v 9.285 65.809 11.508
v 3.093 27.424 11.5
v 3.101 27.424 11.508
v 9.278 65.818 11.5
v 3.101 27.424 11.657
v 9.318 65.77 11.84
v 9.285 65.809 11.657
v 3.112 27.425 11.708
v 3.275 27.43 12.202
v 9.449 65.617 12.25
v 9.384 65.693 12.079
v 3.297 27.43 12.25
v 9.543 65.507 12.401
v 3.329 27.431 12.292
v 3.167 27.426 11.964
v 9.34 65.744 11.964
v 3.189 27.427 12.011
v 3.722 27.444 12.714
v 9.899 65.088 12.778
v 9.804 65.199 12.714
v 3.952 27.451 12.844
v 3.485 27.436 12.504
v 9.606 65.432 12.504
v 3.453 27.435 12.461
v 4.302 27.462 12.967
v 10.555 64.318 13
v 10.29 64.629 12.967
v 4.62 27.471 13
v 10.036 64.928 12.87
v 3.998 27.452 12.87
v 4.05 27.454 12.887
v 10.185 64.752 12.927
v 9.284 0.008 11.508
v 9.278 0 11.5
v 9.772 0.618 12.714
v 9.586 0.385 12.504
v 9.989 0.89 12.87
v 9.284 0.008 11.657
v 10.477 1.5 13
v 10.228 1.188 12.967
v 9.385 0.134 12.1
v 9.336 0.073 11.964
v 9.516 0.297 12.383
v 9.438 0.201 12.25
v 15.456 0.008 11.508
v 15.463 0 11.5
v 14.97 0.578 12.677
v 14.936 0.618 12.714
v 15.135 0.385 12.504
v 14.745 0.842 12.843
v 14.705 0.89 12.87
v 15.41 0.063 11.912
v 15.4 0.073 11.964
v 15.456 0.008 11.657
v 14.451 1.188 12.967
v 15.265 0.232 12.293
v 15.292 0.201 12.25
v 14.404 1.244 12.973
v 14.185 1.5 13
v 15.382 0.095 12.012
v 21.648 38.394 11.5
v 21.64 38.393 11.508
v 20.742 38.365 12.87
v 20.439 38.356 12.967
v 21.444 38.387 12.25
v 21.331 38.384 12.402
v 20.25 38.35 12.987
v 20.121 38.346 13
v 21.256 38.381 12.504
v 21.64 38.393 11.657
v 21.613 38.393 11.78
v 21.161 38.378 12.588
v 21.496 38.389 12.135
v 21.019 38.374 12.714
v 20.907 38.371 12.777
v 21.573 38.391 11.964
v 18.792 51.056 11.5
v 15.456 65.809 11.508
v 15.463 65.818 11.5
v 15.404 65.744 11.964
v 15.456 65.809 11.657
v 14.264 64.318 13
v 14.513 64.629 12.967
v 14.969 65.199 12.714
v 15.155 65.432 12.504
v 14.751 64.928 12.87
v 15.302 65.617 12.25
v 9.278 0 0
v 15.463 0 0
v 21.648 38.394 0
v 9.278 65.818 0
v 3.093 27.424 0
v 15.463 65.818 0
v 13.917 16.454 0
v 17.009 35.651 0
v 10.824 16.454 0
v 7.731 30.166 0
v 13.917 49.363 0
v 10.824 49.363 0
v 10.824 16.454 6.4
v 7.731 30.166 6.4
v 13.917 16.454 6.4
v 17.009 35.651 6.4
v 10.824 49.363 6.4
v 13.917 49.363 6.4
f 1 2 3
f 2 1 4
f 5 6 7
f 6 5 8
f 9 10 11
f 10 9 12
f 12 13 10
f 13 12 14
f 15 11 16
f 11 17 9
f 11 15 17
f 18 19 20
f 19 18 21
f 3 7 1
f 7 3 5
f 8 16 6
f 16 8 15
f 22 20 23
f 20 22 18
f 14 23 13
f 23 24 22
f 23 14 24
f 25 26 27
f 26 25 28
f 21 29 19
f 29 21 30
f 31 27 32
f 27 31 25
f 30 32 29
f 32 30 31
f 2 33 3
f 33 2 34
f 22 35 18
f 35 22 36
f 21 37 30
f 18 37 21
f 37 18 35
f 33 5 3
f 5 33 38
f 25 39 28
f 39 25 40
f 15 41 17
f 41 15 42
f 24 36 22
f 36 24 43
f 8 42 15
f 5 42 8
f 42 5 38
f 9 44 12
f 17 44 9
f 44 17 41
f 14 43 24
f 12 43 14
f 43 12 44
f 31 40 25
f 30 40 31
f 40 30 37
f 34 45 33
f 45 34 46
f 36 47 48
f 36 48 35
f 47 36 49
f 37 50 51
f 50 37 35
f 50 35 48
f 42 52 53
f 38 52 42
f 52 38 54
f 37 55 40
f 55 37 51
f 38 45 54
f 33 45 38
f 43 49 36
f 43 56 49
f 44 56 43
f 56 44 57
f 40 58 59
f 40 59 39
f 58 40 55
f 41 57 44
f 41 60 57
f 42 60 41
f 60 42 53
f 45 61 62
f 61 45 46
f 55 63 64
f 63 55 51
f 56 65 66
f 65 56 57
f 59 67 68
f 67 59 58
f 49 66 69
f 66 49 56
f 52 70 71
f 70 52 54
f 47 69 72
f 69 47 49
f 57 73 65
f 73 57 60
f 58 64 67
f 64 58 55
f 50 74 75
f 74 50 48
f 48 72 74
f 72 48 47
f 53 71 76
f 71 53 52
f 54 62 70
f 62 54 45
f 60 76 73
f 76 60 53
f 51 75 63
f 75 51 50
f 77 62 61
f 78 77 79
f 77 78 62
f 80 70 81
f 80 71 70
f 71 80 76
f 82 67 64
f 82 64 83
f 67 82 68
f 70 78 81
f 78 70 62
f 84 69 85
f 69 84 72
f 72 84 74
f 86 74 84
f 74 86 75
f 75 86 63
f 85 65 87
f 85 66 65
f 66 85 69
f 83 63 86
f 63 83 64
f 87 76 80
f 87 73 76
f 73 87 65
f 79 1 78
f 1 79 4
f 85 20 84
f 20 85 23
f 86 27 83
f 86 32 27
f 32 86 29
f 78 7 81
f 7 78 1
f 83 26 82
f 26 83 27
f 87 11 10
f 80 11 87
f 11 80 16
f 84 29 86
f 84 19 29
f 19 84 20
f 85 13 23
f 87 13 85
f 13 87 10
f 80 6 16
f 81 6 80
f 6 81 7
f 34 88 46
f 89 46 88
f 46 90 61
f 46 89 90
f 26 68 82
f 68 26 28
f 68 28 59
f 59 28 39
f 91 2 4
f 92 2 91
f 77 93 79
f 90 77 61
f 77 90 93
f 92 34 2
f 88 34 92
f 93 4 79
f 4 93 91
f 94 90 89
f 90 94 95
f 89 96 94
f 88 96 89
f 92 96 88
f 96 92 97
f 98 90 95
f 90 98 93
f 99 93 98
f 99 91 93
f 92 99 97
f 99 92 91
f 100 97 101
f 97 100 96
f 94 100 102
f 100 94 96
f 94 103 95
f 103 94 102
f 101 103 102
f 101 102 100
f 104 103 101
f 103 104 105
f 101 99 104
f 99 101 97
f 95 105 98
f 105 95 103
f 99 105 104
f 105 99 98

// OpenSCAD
// file: values.scad
$fs=0.1;
//Constants:
edgeRadius=1.5;
underKeyWidth=13.6;
baseHeight=9.75;
genh=5.791666666666667;
a=27.423996629776394;
b=12.370392724366756;
c=12.370392724366756;
d=38.393595281686956;
overhead=65.81759191146335;
keyTravelDistance=13.0;
desiredGamut=24;
shift=3.092598181091689;
holeScale=0.5;
stalkScale=0.48;

Points = [
[shift,a,0],//0
[(b-shift),0,0],//1
[(b+shift),0,0],//2
[(b+c-shift),d,0],//3
[(c+shift),(a+d),0],//4
[(c-shift),(a+d),0],//5
[shift,a,keyTravelDistance],//6
[(b-shift),0,keyTravelDistance],//7
[(b+shift),0,keyTravelDistance],//8
[(b+c-shift),d,keyTravelDistance],//9
[(c+shift),(a+d),keyTravelDistance],//10
[(c-shift),(a+d),keyTravelDistance],//11
];
Faces = [
[0,1,2,3,4,5],
[1,0,6,7],
[2,1,7,8],
[3,2,8,9],
[4,3,9,10],
[5,4,10,11],
[0,5,11,6],
[11,10,9,8,7,6] 
];
// main file
include<values.scad>;
keytop();

module keytopShape(){
polyhedron(Points,Faces);
}
module keytop(){
difference(){
keytopShape();
translate([(b+c)/4,(d+a)/4,-0.1])
scale(holeScale,holeScale,holeScale)
keytopShape();
edge(6,11,1,-1);
edge(6,7,1,1);
edge(7,8,1,1);
edge(8,9,1,1);
edge(9,10,1,-1,-1);
edge(10,11,1,-1);
}
module edge (point1,point2,d1,d2,d3=1){
difference(){
translate([Points[point1][0],Points[point1][1],Points[point1][2]])
rotate([0,90,atan((Points[point2][1]-Points[point1][1])/(Points[point2][0]-Points[point1][0]))])
translate([0,0,d3*30])
rotate(45,0,0)
cube([pow(2*(edgeRadius*edgeRadius),1/2),pow(2*(edgeRadius*edgeRadius),1/2),90],true);
translate([Points[point1][0],Points[point1][1],Points[point1][2]])
rotate([0,90,atan((Points[point2][1]-Points[point1][1])/(Points[point2][0]-Points[point1][0]))])
translate([d1*edgeRadius,d2*edgeRadius,d3*30])
cylinder(90,edgeRadius,edgeRadius, true);
}
}

}
